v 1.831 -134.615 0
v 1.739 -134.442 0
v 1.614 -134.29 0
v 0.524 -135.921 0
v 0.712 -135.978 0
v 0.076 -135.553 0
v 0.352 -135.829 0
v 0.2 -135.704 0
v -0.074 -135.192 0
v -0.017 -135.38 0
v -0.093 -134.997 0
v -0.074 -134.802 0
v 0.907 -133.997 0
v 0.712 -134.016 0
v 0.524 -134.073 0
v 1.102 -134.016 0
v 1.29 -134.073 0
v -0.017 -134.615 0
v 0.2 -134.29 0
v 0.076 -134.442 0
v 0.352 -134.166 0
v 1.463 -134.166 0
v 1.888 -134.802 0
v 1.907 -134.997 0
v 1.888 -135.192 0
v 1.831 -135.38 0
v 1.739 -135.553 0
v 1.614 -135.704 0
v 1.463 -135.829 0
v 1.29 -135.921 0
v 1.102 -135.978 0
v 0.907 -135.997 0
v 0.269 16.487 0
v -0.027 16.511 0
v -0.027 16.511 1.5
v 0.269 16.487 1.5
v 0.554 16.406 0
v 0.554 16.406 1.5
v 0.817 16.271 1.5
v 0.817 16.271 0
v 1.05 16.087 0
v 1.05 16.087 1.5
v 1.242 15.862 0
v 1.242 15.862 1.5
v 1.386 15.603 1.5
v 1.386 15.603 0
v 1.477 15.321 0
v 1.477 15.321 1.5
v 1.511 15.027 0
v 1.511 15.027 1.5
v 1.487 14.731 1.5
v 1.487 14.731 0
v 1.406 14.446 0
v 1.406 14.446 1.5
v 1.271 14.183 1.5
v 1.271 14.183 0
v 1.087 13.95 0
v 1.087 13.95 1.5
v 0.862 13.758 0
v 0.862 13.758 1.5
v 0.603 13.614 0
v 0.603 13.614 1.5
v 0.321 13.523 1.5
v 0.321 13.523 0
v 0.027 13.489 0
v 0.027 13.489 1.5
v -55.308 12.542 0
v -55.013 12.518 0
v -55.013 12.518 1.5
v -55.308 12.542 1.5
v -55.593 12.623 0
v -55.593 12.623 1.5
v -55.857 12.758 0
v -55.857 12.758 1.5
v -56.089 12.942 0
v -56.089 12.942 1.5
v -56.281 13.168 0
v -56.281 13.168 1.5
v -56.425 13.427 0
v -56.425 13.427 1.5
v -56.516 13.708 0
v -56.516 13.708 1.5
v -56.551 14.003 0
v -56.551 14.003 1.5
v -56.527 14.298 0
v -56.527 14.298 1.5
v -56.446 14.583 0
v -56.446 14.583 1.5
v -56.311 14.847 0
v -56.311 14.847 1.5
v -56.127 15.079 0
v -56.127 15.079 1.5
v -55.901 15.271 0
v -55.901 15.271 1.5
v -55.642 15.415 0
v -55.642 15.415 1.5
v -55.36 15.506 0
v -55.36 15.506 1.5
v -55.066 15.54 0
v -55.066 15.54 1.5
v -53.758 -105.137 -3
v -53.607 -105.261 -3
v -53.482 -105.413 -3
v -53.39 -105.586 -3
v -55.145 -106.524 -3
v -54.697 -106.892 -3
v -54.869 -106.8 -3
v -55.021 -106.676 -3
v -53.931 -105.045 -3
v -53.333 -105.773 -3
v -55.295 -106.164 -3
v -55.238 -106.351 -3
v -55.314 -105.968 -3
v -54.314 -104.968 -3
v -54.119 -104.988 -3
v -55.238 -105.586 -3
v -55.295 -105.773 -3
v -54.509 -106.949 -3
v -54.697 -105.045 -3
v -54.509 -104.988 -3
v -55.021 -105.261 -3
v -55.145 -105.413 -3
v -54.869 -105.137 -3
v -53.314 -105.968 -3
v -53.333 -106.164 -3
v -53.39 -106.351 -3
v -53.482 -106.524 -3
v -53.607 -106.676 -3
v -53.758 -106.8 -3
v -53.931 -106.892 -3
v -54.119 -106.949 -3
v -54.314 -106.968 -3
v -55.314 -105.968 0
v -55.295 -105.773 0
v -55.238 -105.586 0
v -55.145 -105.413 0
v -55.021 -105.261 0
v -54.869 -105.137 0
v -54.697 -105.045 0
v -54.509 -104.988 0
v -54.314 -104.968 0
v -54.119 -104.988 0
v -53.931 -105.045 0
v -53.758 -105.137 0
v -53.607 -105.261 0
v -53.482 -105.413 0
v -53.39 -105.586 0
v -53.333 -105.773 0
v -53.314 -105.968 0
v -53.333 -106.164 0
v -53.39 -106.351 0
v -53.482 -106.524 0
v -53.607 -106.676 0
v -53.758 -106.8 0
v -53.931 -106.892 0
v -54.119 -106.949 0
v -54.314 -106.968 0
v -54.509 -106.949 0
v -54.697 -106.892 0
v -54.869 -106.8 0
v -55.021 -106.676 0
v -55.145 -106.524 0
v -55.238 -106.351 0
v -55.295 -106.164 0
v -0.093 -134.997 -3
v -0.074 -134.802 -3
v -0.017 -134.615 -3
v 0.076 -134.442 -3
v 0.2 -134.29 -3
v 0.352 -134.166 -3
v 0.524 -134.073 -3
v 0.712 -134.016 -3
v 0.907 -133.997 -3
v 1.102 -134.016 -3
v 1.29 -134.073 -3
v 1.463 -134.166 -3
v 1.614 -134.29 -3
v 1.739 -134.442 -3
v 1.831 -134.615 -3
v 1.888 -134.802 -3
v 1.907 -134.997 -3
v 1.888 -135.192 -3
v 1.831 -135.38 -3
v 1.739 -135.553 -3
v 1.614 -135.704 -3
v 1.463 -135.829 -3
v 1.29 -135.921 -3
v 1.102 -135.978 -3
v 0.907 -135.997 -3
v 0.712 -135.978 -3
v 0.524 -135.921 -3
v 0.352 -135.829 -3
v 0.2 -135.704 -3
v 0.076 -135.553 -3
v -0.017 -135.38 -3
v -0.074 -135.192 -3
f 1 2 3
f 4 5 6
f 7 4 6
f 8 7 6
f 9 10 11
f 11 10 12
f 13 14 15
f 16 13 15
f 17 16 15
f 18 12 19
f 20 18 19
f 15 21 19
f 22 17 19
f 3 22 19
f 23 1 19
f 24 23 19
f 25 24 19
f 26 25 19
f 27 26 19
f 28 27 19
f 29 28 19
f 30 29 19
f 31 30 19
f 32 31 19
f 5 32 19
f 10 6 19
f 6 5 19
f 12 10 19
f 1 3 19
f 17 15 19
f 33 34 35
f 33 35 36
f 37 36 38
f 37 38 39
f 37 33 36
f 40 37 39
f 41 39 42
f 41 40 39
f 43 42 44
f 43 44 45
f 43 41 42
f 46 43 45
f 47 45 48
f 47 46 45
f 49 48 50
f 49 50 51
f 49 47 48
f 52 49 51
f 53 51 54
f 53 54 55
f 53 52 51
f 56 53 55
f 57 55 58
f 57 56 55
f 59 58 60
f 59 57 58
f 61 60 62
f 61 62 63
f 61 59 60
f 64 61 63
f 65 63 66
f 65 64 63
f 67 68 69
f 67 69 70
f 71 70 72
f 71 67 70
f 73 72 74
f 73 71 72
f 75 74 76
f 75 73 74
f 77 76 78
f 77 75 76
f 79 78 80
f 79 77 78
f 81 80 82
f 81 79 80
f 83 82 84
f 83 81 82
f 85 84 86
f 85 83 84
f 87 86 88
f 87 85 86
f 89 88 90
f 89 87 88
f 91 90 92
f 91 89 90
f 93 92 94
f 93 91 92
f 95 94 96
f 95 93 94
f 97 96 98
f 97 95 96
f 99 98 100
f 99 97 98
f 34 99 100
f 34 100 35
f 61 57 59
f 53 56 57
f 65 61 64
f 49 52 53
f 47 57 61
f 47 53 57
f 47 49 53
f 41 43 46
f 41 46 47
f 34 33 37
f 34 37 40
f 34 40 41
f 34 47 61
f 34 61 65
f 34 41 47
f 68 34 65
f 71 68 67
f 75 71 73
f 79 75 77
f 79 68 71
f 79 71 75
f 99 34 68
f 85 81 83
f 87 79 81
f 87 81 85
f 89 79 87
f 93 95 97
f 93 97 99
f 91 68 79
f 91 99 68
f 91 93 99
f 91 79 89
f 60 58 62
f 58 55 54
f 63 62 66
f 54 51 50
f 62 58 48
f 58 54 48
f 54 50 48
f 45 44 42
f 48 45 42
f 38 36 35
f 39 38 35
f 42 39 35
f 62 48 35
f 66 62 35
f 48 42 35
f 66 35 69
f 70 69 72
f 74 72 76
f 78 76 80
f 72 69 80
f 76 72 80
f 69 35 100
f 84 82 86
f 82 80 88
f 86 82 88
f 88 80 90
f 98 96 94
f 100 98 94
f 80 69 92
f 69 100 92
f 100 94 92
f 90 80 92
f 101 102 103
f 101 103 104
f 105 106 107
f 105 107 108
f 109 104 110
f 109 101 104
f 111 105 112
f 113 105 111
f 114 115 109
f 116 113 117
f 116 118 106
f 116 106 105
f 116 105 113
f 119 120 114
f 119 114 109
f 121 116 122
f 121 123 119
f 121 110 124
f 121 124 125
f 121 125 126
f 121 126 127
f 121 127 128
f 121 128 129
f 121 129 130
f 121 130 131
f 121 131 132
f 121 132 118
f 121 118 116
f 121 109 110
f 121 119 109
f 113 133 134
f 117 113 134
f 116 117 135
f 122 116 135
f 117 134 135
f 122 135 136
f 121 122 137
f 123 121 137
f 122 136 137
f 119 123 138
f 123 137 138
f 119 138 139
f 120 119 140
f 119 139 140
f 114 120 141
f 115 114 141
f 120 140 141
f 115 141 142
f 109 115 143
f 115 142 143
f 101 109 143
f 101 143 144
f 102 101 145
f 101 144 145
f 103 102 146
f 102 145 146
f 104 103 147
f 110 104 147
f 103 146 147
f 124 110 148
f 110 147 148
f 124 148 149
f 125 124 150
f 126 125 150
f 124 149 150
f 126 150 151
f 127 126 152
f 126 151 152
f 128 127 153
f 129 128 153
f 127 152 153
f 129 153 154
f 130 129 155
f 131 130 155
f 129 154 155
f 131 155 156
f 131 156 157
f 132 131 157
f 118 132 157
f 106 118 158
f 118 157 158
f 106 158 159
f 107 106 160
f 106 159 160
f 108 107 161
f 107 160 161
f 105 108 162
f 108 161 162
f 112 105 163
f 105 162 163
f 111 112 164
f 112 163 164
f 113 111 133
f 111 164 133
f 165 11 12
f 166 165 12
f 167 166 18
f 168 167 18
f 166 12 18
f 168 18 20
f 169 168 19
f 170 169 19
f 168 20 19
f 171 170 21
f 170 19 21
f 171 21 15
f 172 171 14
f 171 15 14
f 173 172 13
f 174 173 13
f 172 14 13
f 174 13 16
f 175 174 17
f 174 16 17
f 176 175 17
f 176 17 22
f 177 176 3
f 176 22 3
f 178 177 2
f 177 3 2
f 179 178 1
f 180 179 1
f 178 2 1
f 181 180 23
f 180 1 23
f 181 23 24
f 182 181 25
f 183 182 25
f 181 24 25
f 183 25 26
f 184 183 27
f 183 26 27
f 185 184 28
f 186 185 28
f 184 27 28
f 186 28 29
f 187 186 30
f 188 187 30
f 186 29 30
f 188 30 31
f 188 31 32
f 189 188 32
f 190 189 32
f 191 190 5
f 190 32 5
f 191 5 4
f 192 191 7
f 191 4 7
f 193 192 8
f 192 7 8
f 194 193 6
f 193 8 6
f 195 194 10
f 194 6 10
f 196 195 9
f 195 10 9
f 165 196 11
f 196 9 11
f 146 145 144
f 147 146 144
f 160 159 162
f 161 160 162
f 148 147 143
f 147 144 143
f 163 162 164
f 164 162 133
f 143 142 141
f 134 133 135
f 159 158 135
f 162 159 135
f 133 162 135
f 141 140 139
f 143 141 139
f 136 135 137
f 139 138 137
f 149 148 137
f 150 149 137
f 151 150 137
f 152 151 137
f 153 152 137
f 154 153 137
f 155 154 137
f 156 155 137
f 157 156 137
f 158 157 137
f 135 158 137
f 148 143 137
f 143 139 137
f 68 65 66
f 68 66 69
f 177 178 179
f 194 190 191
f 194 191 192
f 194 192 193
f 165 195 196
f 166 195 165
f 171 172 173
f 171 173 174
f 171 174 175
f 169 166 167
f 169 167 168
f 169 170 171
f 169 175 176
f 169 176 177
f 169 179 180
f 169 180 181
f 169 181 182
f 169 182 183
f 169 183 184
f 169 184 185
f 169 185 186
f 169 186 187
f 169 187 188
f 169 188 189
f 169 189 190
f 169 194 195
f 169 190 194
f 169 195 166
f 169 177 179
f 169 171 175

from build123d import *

# Parameters (mm, degrees)
BOSS_EXTRUDE1_DEPTH   = 1.5
SKETCH2_R             = 1
BOSS_EXTRUDE2_DEPTH   = 3
BOSS_EXTRUDE2_2_DEPTH = 3


with BuildPart() as part:
    # Sketch1 → Boss-Extrude1 (new body)
    with BuildSketch(Plane.XY):
        with BuildLine():
            Line((-55.066213656, 15.540423387), (-0.026647042, 16.511040453))
            ThreePointArc((-0.026647042, 16.511040453), (1.511040453, 15.026647042), (0.026647042, 13.488959547))
            Line((0.026647042, 13.488959547), (-55.012919571, 12.518342481))
            ThreePointArc((-55.012919571, 12.518342481), (-56.550607067, 14.002735892), (-55.066213656, 15.540423387))
        make_face()
    extrude(amount=BOSS_EXTRUDE1_DEPTH)


with BuildPart() as body_2:
    # Sketch2 → Boss-Extrude2 (new body)
    with BuildSketch(Plane(origin=(0, 0, 0), x_dir=(-1, 0, 0), z_dir=(0, 0, -1))):
        with Locations((54.313883932, -105.968422815)):
            Circle(SKETCH2_R)
    extrude(amount=BOSS_EXTRUDE2_DEPTH)


with BuildPart() as body_3:
    # Sketch2 → Boss-Extrude2 2 (new body)
    with BuildSketch(Plane(origin=(0, 0, 0), x_dir=(-1, 0, 0), z_dir=(0, 0, -1))):
        with Locations((-0.907103352, -134.997257187)):
            Circle(SKETCH2_R)
    extrude(amount=BOSS_EXTRUDE2_2_DEPTH)


solid = Compound([part.part, body_2.part, body_3.part])
